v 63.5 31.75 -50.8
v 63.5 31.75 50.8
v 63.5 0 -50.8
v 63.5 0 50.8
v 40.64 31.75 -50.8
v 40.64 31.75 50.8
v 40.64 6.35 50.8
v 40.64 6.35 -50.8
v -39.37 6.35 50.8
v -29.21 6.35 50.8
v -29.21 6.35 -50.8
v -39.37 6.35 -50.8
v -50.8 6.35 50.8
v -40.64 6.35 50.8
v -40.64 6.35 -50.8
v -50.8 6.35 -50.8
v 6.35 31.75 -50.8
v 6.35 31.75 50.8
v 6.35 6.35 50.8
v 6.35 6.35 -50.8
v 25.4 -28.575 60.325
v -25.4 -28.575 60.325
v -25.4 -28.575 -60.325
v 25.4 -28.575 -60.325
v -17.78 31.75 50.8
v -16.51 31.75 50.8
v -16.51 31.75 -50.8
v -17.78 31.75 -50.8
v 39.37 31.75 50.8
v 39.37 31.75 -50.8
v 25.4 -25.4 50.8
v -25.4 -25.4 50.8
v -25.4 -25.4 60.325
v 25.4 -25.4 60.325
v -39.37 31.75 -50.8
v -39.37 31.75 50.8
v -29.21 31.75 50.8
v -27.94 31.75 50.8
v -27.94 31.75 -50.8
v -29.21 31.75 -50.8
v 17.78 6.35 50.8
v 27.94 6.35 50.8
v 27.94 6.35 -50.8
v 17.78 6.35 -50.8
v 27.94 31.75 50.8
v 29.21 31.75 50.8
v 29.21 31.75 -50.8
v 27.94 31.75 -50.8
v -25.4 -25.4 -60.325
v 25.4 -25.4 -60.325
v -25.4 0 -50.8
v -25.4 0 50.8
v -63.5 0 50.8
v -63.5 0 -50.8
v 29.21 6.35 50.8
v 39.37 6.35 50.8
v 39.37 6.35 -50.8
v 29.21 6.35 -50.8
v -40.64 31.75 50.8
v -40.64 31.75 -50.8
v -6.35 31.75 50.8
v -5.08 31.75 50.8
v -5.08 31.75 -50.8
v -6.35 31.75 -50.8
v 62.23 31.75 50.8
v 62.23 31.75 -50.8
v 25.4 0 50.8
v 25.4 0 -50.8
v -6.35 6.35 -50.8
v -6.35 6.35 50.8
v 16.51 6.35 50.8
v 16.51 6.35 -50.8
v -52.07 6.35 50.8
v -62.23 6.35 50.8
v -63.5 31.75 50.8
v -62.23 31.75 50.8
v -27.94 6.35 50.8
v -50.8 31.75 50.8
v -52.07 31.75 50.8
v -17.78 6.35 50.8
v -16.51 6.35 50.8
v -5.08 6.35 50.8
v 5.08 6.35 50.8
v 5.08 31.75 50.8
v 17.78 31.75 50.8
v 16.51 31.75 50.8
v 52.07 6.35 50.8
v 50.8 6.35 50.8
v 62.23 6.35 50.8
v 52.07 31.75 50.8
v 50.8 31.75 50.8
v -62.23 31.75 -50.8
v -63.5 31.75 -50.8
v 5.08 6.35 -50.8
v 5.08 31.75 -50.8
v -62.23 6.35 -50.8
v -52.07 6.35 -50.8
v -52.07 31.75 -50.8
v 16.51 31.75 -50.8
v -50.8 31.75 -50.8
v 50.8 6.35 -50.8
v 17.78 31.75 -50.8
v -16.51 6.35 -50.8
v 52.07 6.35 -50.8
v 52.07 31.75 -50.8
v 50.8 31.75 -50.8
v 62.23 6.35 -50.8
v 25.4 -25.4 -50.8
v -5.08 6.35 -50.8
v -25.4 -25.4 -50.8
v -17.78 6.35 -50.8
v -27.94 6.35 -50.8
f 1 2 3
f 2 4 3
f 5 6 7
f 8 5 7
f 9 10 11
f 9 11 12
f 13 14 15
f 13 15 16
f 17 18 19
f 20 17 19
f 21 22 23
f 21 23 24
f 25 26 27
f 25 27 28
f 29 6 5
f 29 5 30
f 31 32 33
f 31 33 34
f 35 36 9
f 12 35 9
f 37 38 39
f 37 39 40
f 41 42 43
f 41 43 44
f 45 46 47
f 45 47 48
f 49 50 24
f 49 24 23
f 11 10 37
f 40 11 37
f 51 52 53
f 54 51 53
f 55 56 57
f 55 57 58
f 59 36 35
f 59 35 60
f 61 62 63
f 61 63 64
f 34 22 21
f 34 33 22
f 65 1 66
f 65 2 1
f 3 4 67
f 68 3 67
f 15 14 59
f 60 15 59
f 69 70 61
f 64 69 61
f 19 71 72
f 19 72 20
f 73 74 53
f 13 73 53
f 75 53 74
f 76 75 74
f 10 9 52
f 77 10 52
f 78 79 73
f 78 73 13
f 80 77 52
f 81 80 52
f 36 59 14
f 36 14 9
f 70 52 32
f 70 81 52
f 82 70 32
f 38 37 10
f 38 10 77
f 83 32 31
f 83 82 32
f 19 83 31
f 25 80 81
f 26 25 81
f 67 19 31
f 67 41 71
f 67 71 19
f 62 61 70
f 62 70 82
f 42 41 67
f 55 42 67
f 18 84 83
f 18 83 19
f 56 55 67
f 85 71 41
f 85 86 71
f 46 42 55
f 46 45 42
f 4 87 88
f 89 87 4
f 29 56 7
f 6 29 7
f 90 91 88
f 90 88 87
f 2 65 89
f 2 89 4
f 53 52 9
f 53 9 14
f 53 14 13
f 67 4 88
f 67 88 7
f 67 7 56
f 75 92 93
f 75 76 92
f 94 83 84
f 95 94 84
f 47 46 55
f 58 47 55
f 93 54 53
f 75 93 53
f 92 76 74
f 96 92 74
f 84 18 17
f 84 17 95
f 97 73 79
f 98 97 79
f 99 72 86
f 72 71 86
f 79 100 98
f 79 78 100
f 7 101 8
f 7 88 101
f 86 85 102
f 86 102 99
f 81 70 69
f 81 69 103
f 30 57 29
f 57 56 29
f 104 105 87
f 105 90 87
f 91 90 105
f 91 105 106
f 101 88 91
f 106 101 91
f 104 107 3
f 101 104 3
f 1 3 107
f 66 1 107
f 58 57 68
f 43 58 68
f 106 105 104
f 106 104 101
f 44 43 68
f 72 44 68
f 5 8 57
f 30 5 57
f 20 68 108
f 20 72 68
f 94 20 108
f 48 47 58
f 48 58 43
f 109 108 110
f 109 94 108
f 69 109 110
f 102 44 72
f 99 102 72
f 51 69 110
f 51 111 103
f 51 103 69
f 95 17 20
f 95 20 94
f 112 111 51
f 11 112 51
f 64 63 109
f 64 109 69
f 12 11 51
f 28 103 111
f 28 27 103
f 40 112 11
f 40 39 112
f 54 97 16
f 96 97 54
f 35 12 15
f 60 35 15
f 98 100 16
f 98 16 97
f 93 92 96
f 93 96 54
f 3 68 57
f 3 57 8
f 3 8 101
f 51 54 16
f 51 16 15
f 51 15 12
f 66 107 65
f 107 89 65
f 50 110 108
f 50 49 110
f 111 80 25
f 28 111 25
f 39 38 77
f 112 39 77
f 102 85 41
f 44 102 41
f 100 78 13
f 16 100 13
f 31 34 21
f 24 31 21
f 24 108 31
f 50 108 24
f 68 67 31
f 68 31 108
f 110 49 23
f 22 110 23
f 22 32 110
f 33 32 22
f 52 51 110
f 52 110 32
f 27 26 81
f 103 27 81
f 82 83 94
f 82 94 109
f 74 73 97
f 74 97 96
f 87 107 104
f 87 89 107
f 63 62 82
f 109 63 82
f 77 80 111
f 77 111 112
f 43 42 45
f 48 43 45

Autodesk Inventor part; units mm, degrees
ref_plane "YZ Plane" through (0, 0, 0) normal (1, 0, 0) x (0, 1, 0)
ref_plane "XZ Plane" through (0, 0, 0) normal (0, 1, 0) x (-1, 0, 0)
ref_plane "XY Plane" through (0, 0, 0) normal (0, 0, 1) x (1, 0, 0)
sketch "Sketch1" plane through (0, 0, 0) normal (0, 1, 0) x (-1, 0, 0)
  line L0 (-63.5, -50.8) -> (63.5, -50.8)
  line L1 (63.5, -50.8) -> (63.5, 50.8)
  line L2 (63.5, 50.8) -> (-63.5, 50.8)
  line L3 (-63.5, 50.8) -> (-63.5, -50.8)
  line L4 (-63.5, -50.8) -> (63.5, 50.8) construction
  line L5 (63.5, -50.8) -> (-63.5, 50.8) construction
  point P0 (0, 0)
  dimension "d0" = 127
  dimension "d1" = 101.6
extrude "Extrusion1" add sketch "Sketch1" along normal blind 31.75
sketch "Sketch2" plane through (-63.5, 0, 50.8) normal (0, 0, 1) x (1, 0, 0)
  line L0 (0, 0) -> (127, 0) projected
  line L1 (0, 0) -> (0, 6.35)
  line L2 (0, 31.75) -> (127, 31.75) projected
  line L3 (0, 6.35) -> (127, 6.35) construction
  line L4 (127, 0) -> (0, 0)
  line L5 (0, 6.35) -> (0, 31.75)
  line L6 (0, 31.75) -> (1.27, 31.75)
  line L7 (1.27, 31.75) -> (1.27, 6.35)
  line L8 (1.27, 6.35) -> (0, 6.35)
  line L9 (127, 0) -> (127, 31.75) projected
  line L10 (127, 31.75) -> (127, 0)
  line L11 (11.43, 6.35) -> (11.43, 31.75)
  line L12 (11.43, 31.75) -> (12.7, 31.75)
  line L13 (12.7, 31.75) -> (12.7, 6.35)
  line L14 (12.7, 6.35) -> (11.43, 6.35)
  line L15 (22.86, 6.35) -> (22.86, 31.75)
  line L16 (22.86, 31.75) -> (24.13, 31.75)
  line L17 (24.13, 31.75) -> (24.13, 6.35)
  line L18 (24.13, 6.35) -> (22.86, 6.35)
  line L19 (34.29, 6.35) -> (34.29, 31.75)
  line L20 (34.29, 31.75) -> (35.56, 31.75)
  line L21 (35.56, 31.75) -> (35.56, 6.35)
  line L22 (35.56, 6.35) -> (34.29, 6.35)
  line L23 (45.72, 6.35) -> (45.72, 31.75)
  line L24 (45.72, 31.75) -> (46.99, 31.75)
  line L25 (46.99, 31.75) -> (46.99, 6.35)
  line L26 (46.99, 6.35) -> (45.72, 6.35)
  line L27 (57.15, 6.35) -> (57.15, 31.75)
  line L28 (57.15, 31.75) -> (58.42, 31.75)
  line L29 (58.42, 31.75) -> (58.42, 6.35)
  line L30 (58.42, 6.35) -> (57.15, 6.35)
  line L31 (68.58, 6.35) -> (68.58, 31.75)
  line L32 (68.58, 31.75) -> (69.85, 31.75)
  line L33 (69.85, 31.75) -> (69.85, 6.35)
  line L34 (69.85, 6.35) -> (68.58, 6.35)
  line L35 (80.01, 6.35) -> (80.01, 31.75)
  line L36 (80.01, 31.75) -> (81.28, 31.75)
  line L37 (81.28, 31.75) -> (81.28, 6.35)
  line L38 (81.28, 6.35) -> (80.01, 6.35)
  line L39 (91.44, 6.35) -> (91.44, 31.75)
  line L40 (91.44, 31.75) -> (92.71, 31.75)
  line L41 (92.71, 31.75) -> (92.71, 6.35)
  line L42 (92.71, 6.35) -> (91.44, 6.35)
  line L43 (102.87, 6.35) -> (102.87, 31.75)
  line L44 (102.87, 31.75) -> (104.14, 31.75)
  line L45 (104.14, 31.75) -> (104.14, 6.35)
  line L46 (104.14, 6.35) -> (102.87, 6.35)
  line L47 (114.3, 6.35) -> (114.3, 31.75)
  line L48 (114.3, 31.75) -> (115.57, 31.75)
  line L49 (115.57, 31.75) -> (115.57, 6.35)
  line L50 (115.57, 6.35) -> (114.3, 6.35)
  line L51 (125.73, 6.35) -> (125.73, 31.75)
  line L52 (125.73, 31.75) -> (127, 31.75)
  line L53 (127, 31.75) -> (127, 6.35)
  line L54 (127, 6.35) -> (125.73, 6.35)
  line L55 (0, 31.75) -> (127, 31.75)
  line L56 (127, 31.75) -> (127, 6.35)
  line L57 (127, 6.35) -> (0, 6.35)
  line L58 (0, 6.35) -> (0, 31.75)
  point P0 (0.635, 31.75)
  point P1 (12.065, 31.75)
  point P2 (23.495, 31.75)
  point P3 (34.925, 31.75)
  point P4 (46.355, 31.75)
  point P5 (57.785, 31.75)
  point P6 (69.215, 31.75)
  point P7 (80.645, 31.75)
  point P8 (92.075, 31.75)
  point P9 (103.505, 31.75)
  point P10 (114.935, 31.75)
  point P11 (126.365, 31.75)
  point P12 (126.365, 31.75)
  point P13 (125.73, 6.35)
  point P14 (115.57, 31.75)
  point P15 (104.14, 6.35)
  point P16 (114.3, 6.35)
  point P17 (114.3, 31.75)
  point P18 (104.14, 31.75)
  point P19 (92.71, 6.35)
  point P20 (102.87, 6.35)
  point P21 (102.87, 31.75)
  point P22 (92.71, 31.75)
  point P23 (81.28, 6.35)
  point P24 (91.44, 6.35)
  point P25 (91.44, 31.75)
  point P26 (81.28, 31.75)
  point P27 (80.01, 6.35)
  point P28 (80.01, 31.75)
  point P29 (69.85, 31.75)
  point P30 (58.42, 6.35)
  point P31 (68.58, 6.35)
  point P32 (68.58, 31.75)
  point P33 (58.42, 31.75)
  point P34 (57.15, 6.35)
  point P35 (57.15, 31.75)
  point P36 (46.99, 31.75)
  point P37 (35.56, 6.35)
  point P38 (45.72, 6.35)
  point P39 (45.72, 31.75)
  point P40 (35.56, 31.75)
  point P41 (24.13, 6.35)
  point P42 (34.29, 31.75)
  point P43 (24.13, 31.75)
  point P44 (12.7, 6.35)
  point P45 (22.86, 31.75)
  point P46 (12.7, 31.75)
  point P47 (11.43, 31.75)
  point P48 (1.27, 31.75)
  dimension "d4" = 6.35
  dimension "d5" = 1.27
  dimension "d36" = 11.43
  dimension "d41" = 0.635
extrude "Extrusion2" cut sketch "Sketch2" against normal blind 122.2375 contours L7 L2 L11 L57 | L57 L49 L2 L51 | L13 L2 L15 L57 | L57 L45 L2 L47 | L17 L2 L19 L57 | L57 L41 L2 L43 | L21 L2 L23 L57 | L57 L37 L2 L39 | L25 L2 L27 L57 | L57 L33 L2 L35 | L29 L2 L31 L57
sketch "Sketch3" plane through (0, 0, 0) normal (0, -1, 0) x (1, 0, 0)
  line L0 (25.4, -60.325) -> (-25.4, -60.325)
  line L1 (-25.4, -60.325) -> (-25.4, 60.325)
  line L2 (-25.4, 60.325) -> (25.4, 60.325)
  line L3 (25.4, 60.325) -> (25.4, -60.325)
  line L4 (25.4, -60.325) -> (-25.4, 60.325) construction
  line L5 (-25.4, -60.325) -> (25.4, 60.325) construction
  point P0 (0, 0)
  dimension "d44" = 50.8
  dimension "d45" = 120.65
extrude "Extrusion3" add sketch "Sketch3" along normal blind 28.575
sketch "Sketch4" plane through (0, 0, 0) normal (0, 1, 0) x (1, 0, 0)
  line L0 (25.4, 50.8) -> (-25.4, 50.8) projected
  line L1 (25.4, 60.325) -> (25.4, 50.8) projected
  line L2 (-25.4, 60.325) -> (25.4, 60.325) projected
  line L3 (-25.4, 50.8) -> (-25.4, 60.325) projected
  line L4 (-25.4, -50.8) -> (25.4, -50.8) projected
  line L5 (-25.4, -60.325) -> (-25.4, -50.8) projected
  line L6 (25.4, -60.325) -> (-25.4, -60.325) projected
  line L7 (25.4, -50.8) -> (25.4, -60.325) projected
  line L8 (-25.4, -60.325) -> (-25.4, 60.325) projected
  line L9 (-25.4, 60.325) -> (25.4, 60.325)
  line L10 (25.4, 60.325) -> (25.4, 50.8)
  line L11 (25.4, 50.8) -> (-25.4, 50.8)
  line L12 (-25.4, 50.8) -> (-25.4, 60.325)
  line L13 (-25.4, -50.8) -> (25.4, -50.8)
  line L14 (25.4, -50.8) -> (25.4, -60.325)
  line L15 (25.4, -60.325) -> (-25.4, -60.325)
  line L16 (-25.4, -60.325) -> (-25.4, -50.8)
  point P0 (0, 0)
extrude "Extrusion4" cut sketch "Sketch4" against normal blind 25.4
properties part number "Heatsink_and_Amplifier"
